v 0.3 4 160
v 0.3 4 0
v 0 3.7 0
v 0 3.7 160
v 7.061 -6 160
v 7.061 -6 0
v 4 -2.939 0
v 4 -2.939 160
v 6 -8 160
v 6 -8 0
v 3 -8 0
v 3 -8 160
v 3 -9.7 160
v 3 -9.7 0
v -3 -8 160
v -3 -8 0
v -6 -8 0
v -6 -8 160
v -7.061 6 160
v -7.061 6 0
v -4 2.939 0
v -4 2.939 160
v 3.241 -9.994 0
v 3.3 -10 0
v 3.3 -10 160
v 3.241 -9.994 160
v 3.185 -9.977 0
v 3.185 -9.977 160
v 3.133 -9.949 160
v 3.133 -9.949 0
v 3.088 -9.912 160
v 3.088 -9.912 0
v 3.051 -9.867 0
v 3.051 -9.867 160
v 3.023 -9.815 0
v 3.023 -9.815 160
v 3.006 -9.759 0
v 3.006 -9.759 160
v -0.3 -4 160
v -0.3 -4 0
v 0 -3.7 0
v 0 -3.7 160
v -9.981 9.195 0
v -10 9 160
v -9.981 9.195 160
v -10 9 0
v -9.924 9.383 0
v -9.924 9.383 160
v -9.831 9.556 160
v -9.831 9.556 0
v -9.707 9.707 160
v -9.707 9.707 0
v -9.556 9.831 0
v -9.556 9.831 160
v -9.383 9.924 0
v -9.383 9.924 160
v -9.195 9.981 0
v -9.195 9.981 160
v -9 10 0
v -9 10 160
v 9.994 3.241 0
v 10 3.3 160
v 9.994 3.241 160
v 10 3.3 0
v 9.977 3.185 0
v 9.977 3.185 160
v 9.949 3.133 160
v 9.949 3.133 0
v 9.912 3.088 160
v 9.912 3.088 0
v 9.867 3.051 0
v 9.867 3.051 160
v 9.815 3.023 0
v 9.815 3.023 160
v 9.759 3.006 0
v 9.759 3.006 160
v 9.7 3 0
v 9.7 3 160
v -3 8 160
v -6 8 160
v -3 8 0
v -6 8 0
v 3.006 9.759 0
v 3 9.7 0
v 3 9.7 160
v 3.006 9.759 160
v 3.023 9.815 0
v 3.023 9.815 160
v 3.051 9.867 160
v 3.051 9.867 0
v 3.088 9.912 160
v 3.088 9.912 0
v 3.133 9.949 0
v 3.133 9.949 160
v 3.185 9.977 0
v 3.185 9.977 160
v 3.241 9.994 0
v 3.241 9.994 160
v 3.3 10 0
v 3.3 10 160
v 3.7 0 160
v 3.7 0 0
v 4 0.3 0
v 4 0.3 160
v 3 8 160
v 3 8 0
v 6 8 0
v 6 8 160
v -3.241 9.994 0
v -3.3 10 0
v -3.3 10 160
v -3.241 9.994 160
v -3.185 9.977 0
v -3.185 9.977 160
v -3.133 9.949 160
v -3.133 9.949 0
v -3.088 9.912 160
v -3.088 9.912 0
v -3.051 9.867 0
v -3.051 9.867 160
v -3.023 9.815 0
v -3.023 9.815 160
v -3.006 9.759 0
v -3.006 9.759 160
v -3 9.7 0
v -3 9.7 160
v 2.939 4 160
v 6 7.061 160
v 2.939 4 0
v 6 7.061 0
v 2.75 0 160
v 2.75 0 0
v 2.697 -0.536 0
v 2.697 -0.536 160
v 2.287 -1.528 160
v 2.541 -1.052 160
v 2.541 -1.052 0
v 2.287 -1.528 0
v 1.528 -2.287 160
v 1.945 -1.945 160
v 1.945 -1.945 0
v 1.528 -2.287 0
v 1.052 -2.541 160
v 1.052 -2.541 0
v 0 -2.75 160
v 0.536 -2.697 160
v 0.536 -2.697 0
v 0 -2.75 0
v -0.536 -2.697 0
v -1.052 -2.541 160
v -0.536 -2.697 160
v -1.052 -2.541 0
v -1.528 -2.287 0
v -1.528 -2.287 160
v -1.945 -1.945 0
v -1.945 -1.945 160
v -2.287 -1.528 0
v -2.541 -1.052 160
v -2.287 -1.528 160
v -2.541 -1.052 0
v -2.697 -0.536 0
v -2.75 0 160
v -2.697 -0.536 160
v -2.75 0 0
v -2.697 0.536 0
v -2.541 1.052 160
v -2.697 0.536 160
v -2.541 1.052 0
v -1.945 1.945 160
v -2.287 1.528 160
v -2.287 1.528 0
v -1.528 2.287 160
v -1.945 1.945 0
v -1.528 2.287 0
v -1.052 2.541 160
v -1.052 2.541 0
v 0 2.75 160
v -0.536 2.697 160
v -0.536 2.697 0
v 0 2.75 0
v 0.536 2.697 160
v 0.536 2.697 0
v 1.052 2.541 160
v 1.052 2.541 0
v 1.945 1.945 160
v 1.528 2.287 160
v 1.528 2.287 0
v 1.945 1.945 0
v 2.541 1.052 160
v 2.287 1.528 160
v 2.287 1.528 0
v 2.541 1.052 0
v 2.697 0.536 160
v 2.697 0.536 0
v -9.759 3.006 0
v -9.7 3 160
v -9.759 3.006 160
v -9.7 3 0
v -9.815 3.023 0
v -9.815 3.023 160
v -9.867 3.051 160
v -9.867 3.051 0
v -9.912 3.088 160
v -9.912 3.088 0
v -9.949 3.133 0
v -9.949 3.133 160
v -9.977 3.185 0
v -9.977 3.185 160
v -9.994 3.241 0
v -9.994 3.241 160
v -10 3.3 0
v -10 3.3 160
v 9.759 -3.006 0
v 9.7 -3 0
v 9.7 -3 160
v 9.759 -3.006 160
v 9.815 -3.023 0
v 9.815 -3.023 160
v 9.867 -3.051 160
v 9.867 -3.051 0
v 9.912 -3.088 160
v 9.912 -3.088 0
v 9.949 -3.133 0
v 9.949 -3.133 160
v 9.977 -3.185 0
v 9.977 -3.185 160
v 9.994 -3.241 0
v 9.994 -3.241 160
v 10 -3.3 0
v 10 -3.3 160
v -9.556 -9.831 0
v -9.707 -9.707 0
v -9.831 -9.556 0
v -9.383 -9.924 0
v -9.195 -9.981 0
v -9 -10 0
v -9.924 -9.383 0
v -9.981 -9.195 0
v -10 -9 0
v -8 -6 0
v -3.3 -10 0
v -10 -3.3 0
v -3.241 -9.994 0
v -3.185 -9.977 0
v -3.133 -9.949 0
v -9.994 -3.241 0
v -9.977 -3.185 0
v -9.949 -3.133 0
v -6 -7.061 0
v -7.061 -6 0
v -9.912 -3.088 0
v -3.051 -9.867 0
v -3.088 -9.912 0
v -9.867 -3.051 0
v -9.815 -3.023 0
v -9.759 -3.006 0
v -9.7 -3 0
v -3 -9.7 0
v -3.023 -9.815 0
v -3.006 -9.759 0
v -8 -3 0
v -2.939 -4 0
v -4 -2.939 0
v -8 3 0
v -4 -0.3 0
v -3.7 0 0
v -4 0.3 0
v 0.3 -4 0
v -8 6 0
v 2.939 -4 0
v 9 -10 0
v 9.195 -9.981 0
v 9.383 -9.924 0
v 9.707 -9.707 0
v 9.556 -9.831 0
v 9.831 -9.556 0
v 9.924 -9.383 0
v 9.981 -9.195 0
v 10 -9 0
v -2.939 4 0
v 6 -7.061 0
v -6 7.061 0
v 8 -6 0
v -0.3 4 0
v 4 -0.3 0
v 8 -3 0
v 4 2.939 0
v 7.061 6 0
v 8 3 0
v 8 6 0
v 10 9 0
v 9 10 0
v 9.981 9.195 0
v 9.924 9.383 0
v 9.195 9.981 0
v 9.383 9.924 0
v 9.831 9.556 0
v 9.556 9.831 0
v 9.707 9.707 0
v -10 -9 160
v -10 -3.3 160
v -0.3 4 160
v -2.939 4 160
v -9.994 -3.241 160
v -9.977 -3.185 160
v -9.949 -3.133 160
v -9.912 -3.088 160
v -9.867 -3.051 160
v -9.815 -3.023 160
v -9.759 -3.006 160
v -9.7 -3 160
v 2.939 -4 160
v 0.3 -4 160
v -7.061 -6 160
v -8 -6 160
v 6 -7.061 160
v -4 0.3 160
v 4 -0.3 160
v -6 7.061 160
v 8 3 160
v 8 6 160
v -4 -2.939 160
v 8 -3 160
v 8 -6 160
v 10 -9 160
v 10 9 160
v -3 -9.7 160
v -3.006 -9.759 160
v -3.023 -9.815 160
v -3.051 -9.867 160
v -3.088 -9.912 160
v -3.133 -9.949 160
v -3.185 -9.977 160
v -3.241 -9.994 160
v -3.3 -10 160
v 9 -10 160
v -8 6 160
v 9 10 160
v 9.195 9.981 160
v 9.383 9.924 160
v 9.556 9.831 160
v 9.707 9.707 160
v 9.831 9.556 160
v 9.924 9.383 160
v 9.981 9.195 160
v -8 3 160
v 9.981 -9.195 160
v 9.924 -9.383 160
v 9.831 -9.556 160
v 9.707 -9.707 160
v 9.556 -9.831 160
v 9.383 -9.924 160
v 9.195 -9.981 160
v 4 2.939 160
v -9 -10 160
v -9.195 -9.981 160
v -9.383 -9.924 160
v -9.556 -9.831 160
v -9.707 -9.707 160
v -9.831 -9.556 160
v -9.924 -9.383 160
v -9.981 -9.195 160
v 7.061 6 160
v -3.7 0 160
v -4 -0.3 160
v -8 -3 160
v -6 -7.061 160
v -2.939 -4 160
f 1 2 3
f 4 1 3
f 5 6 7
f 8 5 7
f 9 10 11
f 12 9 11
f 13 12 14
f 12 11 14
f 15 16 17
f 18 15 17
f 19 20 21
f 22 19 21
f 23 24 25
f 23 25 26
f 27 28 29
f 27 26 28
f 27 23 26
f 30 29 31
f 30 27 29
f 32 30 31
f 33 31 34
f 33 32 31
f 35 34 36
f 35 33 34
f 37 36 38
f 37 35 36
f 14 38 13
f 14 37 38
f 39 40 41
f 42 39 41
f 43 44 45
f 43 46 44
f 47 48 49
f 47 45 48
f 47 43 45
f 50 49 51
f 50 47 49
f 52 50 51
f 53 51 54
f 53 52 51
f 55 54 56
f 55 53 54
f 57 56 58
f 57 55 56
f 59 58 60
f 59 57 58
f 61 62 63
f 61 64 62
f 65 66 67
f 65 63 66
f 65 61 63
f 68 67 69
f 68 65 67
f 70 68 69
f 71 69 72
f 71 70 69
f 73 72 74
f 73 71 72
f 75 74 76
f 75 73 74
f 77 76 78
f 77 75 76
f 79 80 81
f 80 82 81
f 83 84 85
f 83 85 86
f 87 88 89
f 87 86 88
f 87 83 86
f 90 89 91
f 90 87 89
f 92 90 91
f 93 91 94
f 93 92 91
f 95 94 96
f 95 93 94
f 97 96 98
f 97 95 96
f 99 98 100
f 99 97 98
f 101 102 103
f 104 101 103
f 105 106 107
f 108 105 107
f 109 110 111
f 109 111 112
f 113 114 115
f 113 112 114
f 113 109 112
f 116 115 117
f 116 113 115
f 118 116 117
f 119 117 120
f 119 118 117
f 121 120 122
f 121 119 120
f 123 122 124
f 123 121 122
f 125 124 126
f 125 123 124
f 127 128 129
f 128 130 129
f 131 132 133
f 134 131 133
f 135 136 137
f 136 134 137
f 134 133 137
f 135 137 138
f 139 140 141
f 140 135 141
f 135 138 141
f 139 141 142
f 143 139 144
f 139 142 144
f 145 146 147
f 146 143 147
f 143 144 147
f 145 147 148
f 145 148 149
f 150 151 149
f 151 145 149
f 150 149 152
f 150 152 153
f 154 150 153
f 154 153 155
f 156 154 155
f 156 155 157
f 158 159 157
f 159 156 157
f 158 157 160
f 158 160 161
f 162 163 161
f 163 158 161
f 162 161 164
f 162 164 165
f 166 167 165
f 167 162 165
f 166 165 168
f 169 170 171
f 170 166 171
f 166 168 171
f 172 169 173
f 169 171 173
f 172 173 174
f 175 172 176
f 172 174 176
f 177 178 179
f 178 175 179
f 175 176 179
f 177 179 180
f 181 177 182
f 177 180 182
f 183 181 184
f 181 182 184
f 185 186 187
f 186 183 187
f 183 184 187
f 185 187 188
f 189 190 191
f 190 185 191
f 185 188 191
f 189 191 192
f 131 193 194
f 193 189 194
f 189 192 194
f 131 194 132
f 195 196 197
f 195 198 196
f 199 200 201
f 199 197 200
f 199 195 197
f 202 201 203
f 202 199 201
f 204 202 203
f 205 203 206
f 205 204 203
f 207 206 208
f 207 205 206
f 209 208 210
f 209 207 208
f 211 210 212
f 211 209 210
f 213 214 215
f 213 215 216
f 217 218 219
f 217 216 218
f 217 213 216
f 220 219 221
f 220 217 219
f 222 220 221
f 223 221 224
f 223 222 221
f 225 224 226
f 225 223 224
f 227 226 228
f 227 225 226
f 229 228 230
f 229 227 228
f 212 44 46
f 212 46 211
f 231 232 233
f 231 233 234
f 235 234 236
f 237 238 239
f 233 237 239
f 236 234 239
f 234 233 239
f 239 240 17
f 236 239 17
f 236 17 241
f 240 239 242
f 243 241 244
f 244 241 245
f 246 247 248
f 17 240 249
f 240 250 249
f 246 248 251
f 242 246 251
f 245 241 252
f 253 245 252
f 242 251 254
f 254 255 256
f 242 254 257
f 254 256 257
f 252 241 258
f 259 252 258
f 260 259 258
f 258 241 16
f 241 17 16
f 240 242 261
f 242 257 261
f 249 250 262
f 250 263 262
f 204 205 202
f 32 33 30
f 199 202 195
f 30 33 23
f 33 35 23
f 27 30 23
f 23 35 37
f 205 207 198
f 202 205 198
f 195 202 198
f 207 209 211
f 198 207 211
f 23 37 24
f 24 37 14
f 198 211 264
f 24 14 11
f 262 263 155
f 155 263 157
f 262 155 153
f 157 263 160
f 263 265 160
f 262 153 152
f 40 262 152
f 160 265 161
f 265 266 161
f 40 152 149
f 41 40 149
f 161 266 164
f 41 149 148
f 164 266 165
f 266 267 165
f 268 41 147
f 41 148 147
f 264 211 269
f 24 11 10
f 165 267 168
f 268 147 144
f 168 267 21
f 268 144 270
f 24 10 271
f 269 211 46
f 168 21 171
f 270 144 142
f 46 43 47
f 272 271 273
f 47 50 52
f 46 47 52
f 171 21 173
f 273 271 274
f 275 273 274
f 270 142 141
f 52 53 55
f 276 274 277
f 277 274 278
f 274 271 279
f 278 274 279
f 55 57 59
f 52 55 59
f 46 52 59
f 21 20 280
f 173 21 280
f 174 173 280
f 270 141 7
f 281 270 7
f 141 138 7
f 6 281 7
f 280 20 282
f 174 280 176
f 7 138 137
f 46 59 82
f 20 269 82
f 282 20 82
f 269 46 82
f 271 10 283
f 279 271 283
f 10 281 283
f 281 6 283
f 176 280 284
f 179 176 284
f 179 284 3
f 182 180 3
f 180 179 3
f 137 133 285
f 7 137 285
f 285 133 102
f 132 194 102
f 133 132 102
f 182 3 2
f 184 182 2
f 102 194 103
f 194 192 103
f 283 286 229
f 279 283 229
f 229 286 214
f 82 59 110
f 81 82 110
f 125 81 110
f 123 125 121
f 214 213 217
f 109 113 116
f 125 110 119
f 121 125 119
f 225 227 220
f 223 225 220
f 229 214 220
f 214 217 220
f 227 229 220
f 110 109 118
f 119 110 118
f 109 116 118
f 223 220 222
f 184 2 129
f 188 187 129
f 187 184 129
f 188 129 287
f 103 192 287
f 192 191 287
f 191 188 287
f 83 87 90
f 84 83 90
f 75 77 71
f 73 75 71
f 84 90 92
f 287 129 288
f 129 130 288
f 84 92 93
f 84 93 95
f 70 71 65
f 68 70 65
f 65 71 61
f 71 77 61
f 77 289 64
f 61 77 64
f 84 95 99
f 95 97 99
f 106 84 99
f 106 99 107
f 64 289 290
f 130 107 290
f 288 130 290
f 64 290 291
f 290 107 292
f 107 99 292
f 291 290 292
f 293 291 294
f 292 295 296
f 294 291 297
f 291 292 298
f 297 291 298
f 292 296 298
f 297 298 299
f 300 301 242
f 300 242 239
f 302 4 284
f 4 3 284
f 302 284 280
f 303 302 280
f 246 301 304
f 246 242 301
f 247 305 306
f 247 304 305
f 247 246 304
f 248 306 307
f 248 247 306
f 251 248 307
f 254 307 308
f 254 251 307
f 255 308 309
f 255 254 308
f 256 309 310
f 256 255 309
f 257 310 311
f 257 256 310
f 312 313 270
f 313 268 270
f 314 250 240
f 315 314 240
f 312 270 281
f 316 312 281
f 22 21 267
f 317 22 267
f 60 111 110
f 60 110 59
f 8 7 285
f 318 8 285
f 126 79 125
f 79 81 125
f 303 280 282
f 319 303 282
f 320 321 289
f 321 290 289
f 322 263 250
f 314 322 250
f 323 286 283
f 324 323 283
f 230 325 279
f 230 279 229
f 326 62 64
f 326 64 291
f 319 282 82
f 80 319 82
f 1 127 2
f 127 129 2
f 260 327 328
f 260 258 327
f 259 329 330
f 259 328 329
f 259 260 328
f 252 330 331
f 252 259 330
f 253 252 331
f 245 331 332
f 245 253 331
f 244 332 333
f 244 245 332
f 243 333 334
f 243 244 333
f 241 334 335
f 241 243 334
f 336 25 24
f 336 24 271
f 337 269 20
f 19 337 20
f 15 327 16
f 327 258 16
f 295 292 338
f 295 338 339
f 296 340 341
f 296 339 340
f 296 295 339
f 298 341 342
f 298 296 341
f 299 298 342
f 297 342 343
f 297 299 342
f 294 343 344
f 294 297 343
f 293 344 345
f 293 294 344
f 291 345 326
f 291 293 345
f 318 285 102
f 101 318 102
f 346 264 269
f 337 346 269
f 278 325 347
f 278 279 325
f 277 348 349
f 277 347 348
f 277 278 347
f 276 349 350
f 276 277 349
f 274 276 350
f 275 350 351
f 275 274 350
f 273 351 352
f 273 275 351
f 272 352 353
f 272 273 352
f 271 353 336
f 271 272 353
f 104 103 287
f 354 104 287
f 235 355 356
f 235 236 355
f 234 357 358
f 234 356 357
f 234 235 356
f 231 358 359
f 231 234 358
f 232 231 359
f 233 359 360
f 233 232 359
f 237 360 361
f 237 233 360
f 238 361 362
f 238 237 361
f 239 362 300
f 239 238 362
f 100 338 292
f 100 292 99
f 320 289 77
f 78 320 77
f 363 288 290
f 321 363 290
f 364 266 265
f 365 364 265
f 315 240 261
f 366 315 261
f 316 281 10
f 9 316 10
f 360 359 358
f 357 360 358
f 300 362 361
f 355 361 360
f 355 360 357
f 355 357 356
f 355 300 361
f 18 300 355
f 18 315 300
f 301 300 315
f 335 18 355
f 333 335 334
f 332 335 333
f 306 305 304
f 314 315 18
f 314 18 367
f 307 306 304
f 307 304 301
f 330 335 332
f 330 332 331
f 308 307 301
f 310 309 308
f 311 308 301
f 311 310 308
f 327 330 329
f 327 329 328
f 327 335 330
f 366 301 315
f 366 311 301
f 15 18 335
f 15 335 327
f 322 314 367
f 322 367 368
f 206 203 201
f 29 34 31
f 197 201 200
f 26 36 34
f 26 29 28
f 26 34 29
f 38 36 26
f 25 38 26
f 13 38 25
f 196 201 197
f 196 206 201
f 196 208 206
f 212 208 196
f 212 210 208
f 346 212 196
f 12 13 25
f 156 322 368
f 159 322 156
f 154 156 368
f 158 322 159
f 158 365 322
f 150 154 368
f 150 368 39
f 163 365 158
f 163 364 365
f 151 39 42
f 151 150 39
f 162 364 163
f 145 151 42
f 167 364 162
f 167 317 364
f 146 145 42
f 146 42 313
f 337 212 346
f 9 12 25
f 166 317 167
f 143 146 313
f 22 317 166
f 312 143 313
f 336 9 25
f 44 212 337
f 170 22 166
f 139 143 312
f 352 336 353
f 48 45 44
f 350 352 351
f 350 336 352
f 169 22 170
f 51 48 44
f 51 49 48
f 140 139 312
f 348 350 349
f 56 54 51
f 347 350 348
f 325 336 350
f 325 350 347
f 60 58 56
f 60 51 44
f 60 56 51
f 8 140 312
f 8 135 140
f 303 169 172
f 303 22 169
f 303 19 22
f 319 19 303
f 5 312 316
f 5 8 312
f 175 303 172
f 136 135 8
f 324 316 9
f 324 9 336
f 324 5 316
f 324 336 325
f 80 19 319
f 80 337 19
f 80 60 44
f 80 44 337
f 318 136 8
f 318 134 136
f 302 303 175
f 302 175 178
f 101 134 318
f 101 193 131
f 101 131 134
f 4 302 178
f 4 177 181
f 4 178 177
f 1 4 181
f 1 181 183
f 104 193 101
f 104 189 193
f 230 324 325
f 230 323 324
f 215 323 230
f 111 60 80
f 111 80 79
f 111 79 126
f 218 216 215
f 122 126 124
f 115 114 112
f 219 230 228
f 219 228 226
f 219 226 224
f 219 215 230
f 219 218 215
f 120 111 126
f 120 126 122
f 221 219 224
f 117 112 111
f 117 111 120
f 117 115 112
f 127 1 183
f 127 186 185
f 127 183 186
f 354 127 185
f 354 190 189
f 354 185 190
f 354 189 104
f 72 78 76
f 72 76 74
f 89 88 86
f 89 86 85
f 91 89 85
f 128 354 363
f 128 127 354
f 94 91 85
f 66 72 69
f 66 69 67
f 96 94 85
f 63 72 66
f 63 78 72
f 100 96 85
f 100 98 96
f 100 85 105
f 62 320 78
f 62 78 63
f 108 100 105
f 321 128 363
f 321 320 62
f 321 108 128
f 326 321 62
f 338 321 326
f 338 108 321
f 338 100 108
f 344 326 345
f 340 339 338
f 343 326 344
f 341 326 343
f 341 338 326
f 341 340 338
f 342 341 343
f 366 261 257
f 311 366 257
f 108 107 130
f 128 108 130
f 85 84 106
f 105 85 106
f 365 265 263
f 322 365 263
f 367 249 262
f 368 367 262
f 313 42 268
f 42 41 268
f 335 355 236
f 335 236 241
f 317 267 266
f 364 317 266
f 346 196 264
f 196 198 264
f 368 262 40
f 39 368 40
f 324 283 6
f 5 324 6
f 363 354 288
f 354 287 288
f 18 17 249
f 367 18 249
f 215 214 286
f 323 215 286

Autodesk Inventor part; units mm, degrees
ref_plane "Startebene" through (0, 0, 0) normal (0, 0, 1) x (1, 0, 0)
ref_plane "Endebene" through (0, 0, 320) normal (0, 0, 1) x (1, 0, 0)
ref_plane "Startebene1" through (0, 0, 0) normal (0, 0, 1) x (1, 0, 0)
ref_plane "Endebene1" through (0, 0, 40) normal (0, 0, 1) x (1, 0, 0)
ref_plane "Startebene2" through (0, 0, 0) normal (0, 0, 1) x (1, 0, 0)
ref_plane "Endebene2" through (0, 0, 40) normal (0, 0, 1) x (1, 0, 0)
ref_plane "Startebene3" through (0, 0, 0) normal (0, 0, 1) x (1, 0, 0)
ref_plane "Endebene3" through (0, 0, 160) normal (0, 0, 1) x (1, 0, 0)
sketch "Skizze" plane through (0, 0, 0) normal (0, 0, 1) x (1, 0, 0)
  line L0 (-10, 9) -> (-10, 3.3)
  arc A0 (-10, 3.3) -> (-9.7, 3) centre (-9.7, 3.3) ccw
  line L1 (-9.7, 3) -> (-8, 3)
  line L2 (-8, 3) -> (-8, 6)
  line L3 (-8, 6) -> (-7.0607, 6)
  line L4 (-7.0607, 6) -> (-4, 2.9393)
  line L5 (-4, 2.9393) -> (-4, 0.3)
  line L6 (-4, 0.3) -> (-3.7, 0)
  line L7 (-3.7, 0) -> (-4, -0.3)
  line L8 (-4, -0.3) -> (-4, -2.9393)
  line L9 (-4, -2.9393) -> (-7.0607, -6)
  line L10 (-7.0607, -6) -> (-8, -6)
  line L11 (-8, -6) -> (-8, -3)
  line L12 (-8, -3) -> (-9.7, -3)
  arc A1 (-9.7, -3) -> (-10, -3.3) centre (-9.7, -3.3) ccw
  line L13 (-10, -3.3) -> (-10, -9)
  arc A2 (-10, -9) -> (-9, -10) centre (-9, -9) ccw
  line L14 (-9, -10) -> (-3.3, -10)
  arc A3 (-3.3, -10) -> (-3, -9.7) centre (-3.3, -9.7) ccw
  line L15 (-3, -9.7) -> (-3, -8)
  line L16 (-3, -8) -> (-6, -8)
  line L17 (-6, -8) -> (-6, -7.0607)
  line L18 (-6, -7.0607) -> (-2.9393, -4)
  line L19 (-2.9393, -4) -> (-0.3, -4)
  line L20 (-0.3, -4) -> (0, -3.7)
  line L21 (0, -3.7) -> (0.3, -4)
  line L22 (0.3, -4) -> (2.9393, -4)
  line L23 (2.9393, -4) -> (6, -7.0607)
  line L24 (6, -7.0607) -> (6, -8)
  line L25 (6, -8) -> (3, -8)
  line L26 (3, -8) -> (3, -9.7)
  arc A4 (3, -9.7) -> (3.3, -10) centre (3.3, -9.7) ccw
  line L27 (3.3, -10) -> (9, -10)
  arc A5 (9, -10) -> (10, -9) centre (9, -9) ccw
  line L28 (10, -9) -> (10, -3.3)
  arc A6 (10, -3.3) -> (9.7, -3) centre (9.7, -3.3) ccw
  line L29 (9.7, -3) -> (8, -3)
  line L30 (8, -3) -> (8, -6)
  line L31 (8, -6) -> (7.0607, -6)
  line L32 (7.0607, -6) -> (4, -2.9393)
  line L33 (4, -2.9393) -> (4, -0.3)
  line L34 (4, -0.3) -> (3.7, 0)
  line L35 (3.7, 0) -> (4, 0.3)
  line L36 (4, 0.3) -> (4, 2.9393)
  line L37 (4, 2.9393) -> (7.0607, 6)
  line L38 (7.0607, 6) -> (8, 6)
  line L39 (8, 6) -> (8, 3)
  line L40 (8, 3) -> (9.7, 3)
  arc A7 (9.7, 3) -> (10, 3.3) centre (9.7, 3.3) ccw
  line L41 (10, 3.3) -> (10, 9)
  arc A8 (10, 9) -> (9, 10) centre (9, 9) ccw
  line L42 (9, 10) -> (3.3, 10)
  arc A9 (3.3, 10) -> (3, 9.7) centre (3.3, 9.7) ccw
  line L43 (3, 9.7) -> (3, 8)
  line L44 (3, 8) -> (6, 8)
  line L45 (6, 8) -> (6, 7.0607)
  line L46 (6, 7.0607) -> (2.9393, 4)
  line L47 (2.9393, 4) -> (0.3, 4)
  line L48 (0.3, 4) -> (0, 3.7)
  line L49 (0, 3.7) -> (-0.3, 4)
  line L50 (-0.3, 4) -> (-2.9393, 4)
  line L51 (-2.9393, 4) -> (-6, 7.0607)
  line L52 (-6, 7.0607) -> (-6, 8)
  line L53 (-6, 8) -> (-3, 8)
  line L54 (-3, 8) -> (-3, 9.7)
  arc A10 (-3, 9.7) -> (-3.3, 10) centre (-3.3, 9.7) ccw
  line L55 (-3.3, 10) -> (-9, 10)
  arc A11 (-9, 10) -> (-10, 9) centre (-9, 9) ccw
  circle A12 centre (0, 0) radius 2.75
  dimension "d2" = 5.5
  dimension "d3" = 10
  dimension "d4" = 10
  dimension "d5" = 5.7
  dimension "d6" = 5.7
  dimension "d7" = 1.7
  dimension "d8" = 3
  dimension "d9" = 0.3
  dimension "d10" = 90
  dimension "d11" = 45
  dimension "d12" = 45
  dimension "d13" = 45
  dimension "d14" = 90
  dimension "d15" = 90
  dimension "d16" = 45
  dimension "d17" = 45
  dimension "d18" = 45
  dimension "d19" = 45
  dimension "d20" = 90
  dimension "d21" = 90
  dimension "d22" = 45
  dimension "d23" = 45
  dimension "d24" = 90
  dimension "d25" = 90
  dimension "d26" = 90
  dimension "d27" = 90
  dimension "d28" = 90
  dimension "d29" = 90
  dimension "d30" = 90
  dimension "d31" = 90
  dimension "d32" = 90
  dimension "d33" = 90
  dimension "d34" = 90
  dimension "d35" = 90
  dimension "d36" = 90
  dimension "d37" = 90
  dimension "d38" = 90
  dimension "d39" = 4
  dimension "d40" = 6
  dimension "d41" = 13
  dimension "d42" = 14
  dimension "d43" = 16
  dimension "d44" = 18
  dimension "d45" = 3
  dimension "d46" = 9
  dimension "d47" = 7
  dimension "d48" = 1
  dimension "d49" = 7
  dimension "d50" = 1.5
  dimension "d51" = 1.8663
  dimension "d52" = 3.3663
  dimension "d53" = 1.5
  dimension "d54" = 1.8663
  dimension "d55" = 3.3663
  dimension "d56" = 4
  dimension "d57" = 10.8187
  dimension "d58" = 1.9092
  dimension "d59" = 5
  dimension "d60" = 13
  dimension "d61" = 13
  dimension "d62" = 16.0513
  dimension "d63" = 3.3234
  dimension "d64" = 14
  dimension "d65" = 12.685
extrude "Körper" add sketch "Skizze" along normal up to surface (160 mm away) from surface at 0
sketch "Skizze21" plane through (0, 0, 0) normal (0, 0, 1) x (1, 0, 0)
  line L0 (0, 0) -> (10, 0)
ref_plane "Arbeitsebene18" through (0, 0, 0) normal (0, -1, 0) x (1, 0, 0)
sketch "Skizze22" plane through (0, 0, 0) normal (0, -1, 0) x (1, 0, 0)
  line L0 (-2, 0) -> (12, 0)
  line L1 (-2, 160) -> (12, 160)
  dimension "d80" = 160
equation "\"G_OFFSET_START\" = 0"
equation "\"G_OFFSET_END\" = 0"
equation "\"G_L\" = d80"
equation "\"G_OFFSET_START1\" = 0"
equation "\"G_OFFSET_END1\" = 0"
equation "\"G_OFFSET_START2\" = 0"
equation "\"G_OFFSET_END2\" = 0"
equation "\"G_OFFSET_START3\" = 0"
equation "\"G_OFFSET_END3\" = 0"
properties part number "Alu Profil 20x20 - AP2020"
